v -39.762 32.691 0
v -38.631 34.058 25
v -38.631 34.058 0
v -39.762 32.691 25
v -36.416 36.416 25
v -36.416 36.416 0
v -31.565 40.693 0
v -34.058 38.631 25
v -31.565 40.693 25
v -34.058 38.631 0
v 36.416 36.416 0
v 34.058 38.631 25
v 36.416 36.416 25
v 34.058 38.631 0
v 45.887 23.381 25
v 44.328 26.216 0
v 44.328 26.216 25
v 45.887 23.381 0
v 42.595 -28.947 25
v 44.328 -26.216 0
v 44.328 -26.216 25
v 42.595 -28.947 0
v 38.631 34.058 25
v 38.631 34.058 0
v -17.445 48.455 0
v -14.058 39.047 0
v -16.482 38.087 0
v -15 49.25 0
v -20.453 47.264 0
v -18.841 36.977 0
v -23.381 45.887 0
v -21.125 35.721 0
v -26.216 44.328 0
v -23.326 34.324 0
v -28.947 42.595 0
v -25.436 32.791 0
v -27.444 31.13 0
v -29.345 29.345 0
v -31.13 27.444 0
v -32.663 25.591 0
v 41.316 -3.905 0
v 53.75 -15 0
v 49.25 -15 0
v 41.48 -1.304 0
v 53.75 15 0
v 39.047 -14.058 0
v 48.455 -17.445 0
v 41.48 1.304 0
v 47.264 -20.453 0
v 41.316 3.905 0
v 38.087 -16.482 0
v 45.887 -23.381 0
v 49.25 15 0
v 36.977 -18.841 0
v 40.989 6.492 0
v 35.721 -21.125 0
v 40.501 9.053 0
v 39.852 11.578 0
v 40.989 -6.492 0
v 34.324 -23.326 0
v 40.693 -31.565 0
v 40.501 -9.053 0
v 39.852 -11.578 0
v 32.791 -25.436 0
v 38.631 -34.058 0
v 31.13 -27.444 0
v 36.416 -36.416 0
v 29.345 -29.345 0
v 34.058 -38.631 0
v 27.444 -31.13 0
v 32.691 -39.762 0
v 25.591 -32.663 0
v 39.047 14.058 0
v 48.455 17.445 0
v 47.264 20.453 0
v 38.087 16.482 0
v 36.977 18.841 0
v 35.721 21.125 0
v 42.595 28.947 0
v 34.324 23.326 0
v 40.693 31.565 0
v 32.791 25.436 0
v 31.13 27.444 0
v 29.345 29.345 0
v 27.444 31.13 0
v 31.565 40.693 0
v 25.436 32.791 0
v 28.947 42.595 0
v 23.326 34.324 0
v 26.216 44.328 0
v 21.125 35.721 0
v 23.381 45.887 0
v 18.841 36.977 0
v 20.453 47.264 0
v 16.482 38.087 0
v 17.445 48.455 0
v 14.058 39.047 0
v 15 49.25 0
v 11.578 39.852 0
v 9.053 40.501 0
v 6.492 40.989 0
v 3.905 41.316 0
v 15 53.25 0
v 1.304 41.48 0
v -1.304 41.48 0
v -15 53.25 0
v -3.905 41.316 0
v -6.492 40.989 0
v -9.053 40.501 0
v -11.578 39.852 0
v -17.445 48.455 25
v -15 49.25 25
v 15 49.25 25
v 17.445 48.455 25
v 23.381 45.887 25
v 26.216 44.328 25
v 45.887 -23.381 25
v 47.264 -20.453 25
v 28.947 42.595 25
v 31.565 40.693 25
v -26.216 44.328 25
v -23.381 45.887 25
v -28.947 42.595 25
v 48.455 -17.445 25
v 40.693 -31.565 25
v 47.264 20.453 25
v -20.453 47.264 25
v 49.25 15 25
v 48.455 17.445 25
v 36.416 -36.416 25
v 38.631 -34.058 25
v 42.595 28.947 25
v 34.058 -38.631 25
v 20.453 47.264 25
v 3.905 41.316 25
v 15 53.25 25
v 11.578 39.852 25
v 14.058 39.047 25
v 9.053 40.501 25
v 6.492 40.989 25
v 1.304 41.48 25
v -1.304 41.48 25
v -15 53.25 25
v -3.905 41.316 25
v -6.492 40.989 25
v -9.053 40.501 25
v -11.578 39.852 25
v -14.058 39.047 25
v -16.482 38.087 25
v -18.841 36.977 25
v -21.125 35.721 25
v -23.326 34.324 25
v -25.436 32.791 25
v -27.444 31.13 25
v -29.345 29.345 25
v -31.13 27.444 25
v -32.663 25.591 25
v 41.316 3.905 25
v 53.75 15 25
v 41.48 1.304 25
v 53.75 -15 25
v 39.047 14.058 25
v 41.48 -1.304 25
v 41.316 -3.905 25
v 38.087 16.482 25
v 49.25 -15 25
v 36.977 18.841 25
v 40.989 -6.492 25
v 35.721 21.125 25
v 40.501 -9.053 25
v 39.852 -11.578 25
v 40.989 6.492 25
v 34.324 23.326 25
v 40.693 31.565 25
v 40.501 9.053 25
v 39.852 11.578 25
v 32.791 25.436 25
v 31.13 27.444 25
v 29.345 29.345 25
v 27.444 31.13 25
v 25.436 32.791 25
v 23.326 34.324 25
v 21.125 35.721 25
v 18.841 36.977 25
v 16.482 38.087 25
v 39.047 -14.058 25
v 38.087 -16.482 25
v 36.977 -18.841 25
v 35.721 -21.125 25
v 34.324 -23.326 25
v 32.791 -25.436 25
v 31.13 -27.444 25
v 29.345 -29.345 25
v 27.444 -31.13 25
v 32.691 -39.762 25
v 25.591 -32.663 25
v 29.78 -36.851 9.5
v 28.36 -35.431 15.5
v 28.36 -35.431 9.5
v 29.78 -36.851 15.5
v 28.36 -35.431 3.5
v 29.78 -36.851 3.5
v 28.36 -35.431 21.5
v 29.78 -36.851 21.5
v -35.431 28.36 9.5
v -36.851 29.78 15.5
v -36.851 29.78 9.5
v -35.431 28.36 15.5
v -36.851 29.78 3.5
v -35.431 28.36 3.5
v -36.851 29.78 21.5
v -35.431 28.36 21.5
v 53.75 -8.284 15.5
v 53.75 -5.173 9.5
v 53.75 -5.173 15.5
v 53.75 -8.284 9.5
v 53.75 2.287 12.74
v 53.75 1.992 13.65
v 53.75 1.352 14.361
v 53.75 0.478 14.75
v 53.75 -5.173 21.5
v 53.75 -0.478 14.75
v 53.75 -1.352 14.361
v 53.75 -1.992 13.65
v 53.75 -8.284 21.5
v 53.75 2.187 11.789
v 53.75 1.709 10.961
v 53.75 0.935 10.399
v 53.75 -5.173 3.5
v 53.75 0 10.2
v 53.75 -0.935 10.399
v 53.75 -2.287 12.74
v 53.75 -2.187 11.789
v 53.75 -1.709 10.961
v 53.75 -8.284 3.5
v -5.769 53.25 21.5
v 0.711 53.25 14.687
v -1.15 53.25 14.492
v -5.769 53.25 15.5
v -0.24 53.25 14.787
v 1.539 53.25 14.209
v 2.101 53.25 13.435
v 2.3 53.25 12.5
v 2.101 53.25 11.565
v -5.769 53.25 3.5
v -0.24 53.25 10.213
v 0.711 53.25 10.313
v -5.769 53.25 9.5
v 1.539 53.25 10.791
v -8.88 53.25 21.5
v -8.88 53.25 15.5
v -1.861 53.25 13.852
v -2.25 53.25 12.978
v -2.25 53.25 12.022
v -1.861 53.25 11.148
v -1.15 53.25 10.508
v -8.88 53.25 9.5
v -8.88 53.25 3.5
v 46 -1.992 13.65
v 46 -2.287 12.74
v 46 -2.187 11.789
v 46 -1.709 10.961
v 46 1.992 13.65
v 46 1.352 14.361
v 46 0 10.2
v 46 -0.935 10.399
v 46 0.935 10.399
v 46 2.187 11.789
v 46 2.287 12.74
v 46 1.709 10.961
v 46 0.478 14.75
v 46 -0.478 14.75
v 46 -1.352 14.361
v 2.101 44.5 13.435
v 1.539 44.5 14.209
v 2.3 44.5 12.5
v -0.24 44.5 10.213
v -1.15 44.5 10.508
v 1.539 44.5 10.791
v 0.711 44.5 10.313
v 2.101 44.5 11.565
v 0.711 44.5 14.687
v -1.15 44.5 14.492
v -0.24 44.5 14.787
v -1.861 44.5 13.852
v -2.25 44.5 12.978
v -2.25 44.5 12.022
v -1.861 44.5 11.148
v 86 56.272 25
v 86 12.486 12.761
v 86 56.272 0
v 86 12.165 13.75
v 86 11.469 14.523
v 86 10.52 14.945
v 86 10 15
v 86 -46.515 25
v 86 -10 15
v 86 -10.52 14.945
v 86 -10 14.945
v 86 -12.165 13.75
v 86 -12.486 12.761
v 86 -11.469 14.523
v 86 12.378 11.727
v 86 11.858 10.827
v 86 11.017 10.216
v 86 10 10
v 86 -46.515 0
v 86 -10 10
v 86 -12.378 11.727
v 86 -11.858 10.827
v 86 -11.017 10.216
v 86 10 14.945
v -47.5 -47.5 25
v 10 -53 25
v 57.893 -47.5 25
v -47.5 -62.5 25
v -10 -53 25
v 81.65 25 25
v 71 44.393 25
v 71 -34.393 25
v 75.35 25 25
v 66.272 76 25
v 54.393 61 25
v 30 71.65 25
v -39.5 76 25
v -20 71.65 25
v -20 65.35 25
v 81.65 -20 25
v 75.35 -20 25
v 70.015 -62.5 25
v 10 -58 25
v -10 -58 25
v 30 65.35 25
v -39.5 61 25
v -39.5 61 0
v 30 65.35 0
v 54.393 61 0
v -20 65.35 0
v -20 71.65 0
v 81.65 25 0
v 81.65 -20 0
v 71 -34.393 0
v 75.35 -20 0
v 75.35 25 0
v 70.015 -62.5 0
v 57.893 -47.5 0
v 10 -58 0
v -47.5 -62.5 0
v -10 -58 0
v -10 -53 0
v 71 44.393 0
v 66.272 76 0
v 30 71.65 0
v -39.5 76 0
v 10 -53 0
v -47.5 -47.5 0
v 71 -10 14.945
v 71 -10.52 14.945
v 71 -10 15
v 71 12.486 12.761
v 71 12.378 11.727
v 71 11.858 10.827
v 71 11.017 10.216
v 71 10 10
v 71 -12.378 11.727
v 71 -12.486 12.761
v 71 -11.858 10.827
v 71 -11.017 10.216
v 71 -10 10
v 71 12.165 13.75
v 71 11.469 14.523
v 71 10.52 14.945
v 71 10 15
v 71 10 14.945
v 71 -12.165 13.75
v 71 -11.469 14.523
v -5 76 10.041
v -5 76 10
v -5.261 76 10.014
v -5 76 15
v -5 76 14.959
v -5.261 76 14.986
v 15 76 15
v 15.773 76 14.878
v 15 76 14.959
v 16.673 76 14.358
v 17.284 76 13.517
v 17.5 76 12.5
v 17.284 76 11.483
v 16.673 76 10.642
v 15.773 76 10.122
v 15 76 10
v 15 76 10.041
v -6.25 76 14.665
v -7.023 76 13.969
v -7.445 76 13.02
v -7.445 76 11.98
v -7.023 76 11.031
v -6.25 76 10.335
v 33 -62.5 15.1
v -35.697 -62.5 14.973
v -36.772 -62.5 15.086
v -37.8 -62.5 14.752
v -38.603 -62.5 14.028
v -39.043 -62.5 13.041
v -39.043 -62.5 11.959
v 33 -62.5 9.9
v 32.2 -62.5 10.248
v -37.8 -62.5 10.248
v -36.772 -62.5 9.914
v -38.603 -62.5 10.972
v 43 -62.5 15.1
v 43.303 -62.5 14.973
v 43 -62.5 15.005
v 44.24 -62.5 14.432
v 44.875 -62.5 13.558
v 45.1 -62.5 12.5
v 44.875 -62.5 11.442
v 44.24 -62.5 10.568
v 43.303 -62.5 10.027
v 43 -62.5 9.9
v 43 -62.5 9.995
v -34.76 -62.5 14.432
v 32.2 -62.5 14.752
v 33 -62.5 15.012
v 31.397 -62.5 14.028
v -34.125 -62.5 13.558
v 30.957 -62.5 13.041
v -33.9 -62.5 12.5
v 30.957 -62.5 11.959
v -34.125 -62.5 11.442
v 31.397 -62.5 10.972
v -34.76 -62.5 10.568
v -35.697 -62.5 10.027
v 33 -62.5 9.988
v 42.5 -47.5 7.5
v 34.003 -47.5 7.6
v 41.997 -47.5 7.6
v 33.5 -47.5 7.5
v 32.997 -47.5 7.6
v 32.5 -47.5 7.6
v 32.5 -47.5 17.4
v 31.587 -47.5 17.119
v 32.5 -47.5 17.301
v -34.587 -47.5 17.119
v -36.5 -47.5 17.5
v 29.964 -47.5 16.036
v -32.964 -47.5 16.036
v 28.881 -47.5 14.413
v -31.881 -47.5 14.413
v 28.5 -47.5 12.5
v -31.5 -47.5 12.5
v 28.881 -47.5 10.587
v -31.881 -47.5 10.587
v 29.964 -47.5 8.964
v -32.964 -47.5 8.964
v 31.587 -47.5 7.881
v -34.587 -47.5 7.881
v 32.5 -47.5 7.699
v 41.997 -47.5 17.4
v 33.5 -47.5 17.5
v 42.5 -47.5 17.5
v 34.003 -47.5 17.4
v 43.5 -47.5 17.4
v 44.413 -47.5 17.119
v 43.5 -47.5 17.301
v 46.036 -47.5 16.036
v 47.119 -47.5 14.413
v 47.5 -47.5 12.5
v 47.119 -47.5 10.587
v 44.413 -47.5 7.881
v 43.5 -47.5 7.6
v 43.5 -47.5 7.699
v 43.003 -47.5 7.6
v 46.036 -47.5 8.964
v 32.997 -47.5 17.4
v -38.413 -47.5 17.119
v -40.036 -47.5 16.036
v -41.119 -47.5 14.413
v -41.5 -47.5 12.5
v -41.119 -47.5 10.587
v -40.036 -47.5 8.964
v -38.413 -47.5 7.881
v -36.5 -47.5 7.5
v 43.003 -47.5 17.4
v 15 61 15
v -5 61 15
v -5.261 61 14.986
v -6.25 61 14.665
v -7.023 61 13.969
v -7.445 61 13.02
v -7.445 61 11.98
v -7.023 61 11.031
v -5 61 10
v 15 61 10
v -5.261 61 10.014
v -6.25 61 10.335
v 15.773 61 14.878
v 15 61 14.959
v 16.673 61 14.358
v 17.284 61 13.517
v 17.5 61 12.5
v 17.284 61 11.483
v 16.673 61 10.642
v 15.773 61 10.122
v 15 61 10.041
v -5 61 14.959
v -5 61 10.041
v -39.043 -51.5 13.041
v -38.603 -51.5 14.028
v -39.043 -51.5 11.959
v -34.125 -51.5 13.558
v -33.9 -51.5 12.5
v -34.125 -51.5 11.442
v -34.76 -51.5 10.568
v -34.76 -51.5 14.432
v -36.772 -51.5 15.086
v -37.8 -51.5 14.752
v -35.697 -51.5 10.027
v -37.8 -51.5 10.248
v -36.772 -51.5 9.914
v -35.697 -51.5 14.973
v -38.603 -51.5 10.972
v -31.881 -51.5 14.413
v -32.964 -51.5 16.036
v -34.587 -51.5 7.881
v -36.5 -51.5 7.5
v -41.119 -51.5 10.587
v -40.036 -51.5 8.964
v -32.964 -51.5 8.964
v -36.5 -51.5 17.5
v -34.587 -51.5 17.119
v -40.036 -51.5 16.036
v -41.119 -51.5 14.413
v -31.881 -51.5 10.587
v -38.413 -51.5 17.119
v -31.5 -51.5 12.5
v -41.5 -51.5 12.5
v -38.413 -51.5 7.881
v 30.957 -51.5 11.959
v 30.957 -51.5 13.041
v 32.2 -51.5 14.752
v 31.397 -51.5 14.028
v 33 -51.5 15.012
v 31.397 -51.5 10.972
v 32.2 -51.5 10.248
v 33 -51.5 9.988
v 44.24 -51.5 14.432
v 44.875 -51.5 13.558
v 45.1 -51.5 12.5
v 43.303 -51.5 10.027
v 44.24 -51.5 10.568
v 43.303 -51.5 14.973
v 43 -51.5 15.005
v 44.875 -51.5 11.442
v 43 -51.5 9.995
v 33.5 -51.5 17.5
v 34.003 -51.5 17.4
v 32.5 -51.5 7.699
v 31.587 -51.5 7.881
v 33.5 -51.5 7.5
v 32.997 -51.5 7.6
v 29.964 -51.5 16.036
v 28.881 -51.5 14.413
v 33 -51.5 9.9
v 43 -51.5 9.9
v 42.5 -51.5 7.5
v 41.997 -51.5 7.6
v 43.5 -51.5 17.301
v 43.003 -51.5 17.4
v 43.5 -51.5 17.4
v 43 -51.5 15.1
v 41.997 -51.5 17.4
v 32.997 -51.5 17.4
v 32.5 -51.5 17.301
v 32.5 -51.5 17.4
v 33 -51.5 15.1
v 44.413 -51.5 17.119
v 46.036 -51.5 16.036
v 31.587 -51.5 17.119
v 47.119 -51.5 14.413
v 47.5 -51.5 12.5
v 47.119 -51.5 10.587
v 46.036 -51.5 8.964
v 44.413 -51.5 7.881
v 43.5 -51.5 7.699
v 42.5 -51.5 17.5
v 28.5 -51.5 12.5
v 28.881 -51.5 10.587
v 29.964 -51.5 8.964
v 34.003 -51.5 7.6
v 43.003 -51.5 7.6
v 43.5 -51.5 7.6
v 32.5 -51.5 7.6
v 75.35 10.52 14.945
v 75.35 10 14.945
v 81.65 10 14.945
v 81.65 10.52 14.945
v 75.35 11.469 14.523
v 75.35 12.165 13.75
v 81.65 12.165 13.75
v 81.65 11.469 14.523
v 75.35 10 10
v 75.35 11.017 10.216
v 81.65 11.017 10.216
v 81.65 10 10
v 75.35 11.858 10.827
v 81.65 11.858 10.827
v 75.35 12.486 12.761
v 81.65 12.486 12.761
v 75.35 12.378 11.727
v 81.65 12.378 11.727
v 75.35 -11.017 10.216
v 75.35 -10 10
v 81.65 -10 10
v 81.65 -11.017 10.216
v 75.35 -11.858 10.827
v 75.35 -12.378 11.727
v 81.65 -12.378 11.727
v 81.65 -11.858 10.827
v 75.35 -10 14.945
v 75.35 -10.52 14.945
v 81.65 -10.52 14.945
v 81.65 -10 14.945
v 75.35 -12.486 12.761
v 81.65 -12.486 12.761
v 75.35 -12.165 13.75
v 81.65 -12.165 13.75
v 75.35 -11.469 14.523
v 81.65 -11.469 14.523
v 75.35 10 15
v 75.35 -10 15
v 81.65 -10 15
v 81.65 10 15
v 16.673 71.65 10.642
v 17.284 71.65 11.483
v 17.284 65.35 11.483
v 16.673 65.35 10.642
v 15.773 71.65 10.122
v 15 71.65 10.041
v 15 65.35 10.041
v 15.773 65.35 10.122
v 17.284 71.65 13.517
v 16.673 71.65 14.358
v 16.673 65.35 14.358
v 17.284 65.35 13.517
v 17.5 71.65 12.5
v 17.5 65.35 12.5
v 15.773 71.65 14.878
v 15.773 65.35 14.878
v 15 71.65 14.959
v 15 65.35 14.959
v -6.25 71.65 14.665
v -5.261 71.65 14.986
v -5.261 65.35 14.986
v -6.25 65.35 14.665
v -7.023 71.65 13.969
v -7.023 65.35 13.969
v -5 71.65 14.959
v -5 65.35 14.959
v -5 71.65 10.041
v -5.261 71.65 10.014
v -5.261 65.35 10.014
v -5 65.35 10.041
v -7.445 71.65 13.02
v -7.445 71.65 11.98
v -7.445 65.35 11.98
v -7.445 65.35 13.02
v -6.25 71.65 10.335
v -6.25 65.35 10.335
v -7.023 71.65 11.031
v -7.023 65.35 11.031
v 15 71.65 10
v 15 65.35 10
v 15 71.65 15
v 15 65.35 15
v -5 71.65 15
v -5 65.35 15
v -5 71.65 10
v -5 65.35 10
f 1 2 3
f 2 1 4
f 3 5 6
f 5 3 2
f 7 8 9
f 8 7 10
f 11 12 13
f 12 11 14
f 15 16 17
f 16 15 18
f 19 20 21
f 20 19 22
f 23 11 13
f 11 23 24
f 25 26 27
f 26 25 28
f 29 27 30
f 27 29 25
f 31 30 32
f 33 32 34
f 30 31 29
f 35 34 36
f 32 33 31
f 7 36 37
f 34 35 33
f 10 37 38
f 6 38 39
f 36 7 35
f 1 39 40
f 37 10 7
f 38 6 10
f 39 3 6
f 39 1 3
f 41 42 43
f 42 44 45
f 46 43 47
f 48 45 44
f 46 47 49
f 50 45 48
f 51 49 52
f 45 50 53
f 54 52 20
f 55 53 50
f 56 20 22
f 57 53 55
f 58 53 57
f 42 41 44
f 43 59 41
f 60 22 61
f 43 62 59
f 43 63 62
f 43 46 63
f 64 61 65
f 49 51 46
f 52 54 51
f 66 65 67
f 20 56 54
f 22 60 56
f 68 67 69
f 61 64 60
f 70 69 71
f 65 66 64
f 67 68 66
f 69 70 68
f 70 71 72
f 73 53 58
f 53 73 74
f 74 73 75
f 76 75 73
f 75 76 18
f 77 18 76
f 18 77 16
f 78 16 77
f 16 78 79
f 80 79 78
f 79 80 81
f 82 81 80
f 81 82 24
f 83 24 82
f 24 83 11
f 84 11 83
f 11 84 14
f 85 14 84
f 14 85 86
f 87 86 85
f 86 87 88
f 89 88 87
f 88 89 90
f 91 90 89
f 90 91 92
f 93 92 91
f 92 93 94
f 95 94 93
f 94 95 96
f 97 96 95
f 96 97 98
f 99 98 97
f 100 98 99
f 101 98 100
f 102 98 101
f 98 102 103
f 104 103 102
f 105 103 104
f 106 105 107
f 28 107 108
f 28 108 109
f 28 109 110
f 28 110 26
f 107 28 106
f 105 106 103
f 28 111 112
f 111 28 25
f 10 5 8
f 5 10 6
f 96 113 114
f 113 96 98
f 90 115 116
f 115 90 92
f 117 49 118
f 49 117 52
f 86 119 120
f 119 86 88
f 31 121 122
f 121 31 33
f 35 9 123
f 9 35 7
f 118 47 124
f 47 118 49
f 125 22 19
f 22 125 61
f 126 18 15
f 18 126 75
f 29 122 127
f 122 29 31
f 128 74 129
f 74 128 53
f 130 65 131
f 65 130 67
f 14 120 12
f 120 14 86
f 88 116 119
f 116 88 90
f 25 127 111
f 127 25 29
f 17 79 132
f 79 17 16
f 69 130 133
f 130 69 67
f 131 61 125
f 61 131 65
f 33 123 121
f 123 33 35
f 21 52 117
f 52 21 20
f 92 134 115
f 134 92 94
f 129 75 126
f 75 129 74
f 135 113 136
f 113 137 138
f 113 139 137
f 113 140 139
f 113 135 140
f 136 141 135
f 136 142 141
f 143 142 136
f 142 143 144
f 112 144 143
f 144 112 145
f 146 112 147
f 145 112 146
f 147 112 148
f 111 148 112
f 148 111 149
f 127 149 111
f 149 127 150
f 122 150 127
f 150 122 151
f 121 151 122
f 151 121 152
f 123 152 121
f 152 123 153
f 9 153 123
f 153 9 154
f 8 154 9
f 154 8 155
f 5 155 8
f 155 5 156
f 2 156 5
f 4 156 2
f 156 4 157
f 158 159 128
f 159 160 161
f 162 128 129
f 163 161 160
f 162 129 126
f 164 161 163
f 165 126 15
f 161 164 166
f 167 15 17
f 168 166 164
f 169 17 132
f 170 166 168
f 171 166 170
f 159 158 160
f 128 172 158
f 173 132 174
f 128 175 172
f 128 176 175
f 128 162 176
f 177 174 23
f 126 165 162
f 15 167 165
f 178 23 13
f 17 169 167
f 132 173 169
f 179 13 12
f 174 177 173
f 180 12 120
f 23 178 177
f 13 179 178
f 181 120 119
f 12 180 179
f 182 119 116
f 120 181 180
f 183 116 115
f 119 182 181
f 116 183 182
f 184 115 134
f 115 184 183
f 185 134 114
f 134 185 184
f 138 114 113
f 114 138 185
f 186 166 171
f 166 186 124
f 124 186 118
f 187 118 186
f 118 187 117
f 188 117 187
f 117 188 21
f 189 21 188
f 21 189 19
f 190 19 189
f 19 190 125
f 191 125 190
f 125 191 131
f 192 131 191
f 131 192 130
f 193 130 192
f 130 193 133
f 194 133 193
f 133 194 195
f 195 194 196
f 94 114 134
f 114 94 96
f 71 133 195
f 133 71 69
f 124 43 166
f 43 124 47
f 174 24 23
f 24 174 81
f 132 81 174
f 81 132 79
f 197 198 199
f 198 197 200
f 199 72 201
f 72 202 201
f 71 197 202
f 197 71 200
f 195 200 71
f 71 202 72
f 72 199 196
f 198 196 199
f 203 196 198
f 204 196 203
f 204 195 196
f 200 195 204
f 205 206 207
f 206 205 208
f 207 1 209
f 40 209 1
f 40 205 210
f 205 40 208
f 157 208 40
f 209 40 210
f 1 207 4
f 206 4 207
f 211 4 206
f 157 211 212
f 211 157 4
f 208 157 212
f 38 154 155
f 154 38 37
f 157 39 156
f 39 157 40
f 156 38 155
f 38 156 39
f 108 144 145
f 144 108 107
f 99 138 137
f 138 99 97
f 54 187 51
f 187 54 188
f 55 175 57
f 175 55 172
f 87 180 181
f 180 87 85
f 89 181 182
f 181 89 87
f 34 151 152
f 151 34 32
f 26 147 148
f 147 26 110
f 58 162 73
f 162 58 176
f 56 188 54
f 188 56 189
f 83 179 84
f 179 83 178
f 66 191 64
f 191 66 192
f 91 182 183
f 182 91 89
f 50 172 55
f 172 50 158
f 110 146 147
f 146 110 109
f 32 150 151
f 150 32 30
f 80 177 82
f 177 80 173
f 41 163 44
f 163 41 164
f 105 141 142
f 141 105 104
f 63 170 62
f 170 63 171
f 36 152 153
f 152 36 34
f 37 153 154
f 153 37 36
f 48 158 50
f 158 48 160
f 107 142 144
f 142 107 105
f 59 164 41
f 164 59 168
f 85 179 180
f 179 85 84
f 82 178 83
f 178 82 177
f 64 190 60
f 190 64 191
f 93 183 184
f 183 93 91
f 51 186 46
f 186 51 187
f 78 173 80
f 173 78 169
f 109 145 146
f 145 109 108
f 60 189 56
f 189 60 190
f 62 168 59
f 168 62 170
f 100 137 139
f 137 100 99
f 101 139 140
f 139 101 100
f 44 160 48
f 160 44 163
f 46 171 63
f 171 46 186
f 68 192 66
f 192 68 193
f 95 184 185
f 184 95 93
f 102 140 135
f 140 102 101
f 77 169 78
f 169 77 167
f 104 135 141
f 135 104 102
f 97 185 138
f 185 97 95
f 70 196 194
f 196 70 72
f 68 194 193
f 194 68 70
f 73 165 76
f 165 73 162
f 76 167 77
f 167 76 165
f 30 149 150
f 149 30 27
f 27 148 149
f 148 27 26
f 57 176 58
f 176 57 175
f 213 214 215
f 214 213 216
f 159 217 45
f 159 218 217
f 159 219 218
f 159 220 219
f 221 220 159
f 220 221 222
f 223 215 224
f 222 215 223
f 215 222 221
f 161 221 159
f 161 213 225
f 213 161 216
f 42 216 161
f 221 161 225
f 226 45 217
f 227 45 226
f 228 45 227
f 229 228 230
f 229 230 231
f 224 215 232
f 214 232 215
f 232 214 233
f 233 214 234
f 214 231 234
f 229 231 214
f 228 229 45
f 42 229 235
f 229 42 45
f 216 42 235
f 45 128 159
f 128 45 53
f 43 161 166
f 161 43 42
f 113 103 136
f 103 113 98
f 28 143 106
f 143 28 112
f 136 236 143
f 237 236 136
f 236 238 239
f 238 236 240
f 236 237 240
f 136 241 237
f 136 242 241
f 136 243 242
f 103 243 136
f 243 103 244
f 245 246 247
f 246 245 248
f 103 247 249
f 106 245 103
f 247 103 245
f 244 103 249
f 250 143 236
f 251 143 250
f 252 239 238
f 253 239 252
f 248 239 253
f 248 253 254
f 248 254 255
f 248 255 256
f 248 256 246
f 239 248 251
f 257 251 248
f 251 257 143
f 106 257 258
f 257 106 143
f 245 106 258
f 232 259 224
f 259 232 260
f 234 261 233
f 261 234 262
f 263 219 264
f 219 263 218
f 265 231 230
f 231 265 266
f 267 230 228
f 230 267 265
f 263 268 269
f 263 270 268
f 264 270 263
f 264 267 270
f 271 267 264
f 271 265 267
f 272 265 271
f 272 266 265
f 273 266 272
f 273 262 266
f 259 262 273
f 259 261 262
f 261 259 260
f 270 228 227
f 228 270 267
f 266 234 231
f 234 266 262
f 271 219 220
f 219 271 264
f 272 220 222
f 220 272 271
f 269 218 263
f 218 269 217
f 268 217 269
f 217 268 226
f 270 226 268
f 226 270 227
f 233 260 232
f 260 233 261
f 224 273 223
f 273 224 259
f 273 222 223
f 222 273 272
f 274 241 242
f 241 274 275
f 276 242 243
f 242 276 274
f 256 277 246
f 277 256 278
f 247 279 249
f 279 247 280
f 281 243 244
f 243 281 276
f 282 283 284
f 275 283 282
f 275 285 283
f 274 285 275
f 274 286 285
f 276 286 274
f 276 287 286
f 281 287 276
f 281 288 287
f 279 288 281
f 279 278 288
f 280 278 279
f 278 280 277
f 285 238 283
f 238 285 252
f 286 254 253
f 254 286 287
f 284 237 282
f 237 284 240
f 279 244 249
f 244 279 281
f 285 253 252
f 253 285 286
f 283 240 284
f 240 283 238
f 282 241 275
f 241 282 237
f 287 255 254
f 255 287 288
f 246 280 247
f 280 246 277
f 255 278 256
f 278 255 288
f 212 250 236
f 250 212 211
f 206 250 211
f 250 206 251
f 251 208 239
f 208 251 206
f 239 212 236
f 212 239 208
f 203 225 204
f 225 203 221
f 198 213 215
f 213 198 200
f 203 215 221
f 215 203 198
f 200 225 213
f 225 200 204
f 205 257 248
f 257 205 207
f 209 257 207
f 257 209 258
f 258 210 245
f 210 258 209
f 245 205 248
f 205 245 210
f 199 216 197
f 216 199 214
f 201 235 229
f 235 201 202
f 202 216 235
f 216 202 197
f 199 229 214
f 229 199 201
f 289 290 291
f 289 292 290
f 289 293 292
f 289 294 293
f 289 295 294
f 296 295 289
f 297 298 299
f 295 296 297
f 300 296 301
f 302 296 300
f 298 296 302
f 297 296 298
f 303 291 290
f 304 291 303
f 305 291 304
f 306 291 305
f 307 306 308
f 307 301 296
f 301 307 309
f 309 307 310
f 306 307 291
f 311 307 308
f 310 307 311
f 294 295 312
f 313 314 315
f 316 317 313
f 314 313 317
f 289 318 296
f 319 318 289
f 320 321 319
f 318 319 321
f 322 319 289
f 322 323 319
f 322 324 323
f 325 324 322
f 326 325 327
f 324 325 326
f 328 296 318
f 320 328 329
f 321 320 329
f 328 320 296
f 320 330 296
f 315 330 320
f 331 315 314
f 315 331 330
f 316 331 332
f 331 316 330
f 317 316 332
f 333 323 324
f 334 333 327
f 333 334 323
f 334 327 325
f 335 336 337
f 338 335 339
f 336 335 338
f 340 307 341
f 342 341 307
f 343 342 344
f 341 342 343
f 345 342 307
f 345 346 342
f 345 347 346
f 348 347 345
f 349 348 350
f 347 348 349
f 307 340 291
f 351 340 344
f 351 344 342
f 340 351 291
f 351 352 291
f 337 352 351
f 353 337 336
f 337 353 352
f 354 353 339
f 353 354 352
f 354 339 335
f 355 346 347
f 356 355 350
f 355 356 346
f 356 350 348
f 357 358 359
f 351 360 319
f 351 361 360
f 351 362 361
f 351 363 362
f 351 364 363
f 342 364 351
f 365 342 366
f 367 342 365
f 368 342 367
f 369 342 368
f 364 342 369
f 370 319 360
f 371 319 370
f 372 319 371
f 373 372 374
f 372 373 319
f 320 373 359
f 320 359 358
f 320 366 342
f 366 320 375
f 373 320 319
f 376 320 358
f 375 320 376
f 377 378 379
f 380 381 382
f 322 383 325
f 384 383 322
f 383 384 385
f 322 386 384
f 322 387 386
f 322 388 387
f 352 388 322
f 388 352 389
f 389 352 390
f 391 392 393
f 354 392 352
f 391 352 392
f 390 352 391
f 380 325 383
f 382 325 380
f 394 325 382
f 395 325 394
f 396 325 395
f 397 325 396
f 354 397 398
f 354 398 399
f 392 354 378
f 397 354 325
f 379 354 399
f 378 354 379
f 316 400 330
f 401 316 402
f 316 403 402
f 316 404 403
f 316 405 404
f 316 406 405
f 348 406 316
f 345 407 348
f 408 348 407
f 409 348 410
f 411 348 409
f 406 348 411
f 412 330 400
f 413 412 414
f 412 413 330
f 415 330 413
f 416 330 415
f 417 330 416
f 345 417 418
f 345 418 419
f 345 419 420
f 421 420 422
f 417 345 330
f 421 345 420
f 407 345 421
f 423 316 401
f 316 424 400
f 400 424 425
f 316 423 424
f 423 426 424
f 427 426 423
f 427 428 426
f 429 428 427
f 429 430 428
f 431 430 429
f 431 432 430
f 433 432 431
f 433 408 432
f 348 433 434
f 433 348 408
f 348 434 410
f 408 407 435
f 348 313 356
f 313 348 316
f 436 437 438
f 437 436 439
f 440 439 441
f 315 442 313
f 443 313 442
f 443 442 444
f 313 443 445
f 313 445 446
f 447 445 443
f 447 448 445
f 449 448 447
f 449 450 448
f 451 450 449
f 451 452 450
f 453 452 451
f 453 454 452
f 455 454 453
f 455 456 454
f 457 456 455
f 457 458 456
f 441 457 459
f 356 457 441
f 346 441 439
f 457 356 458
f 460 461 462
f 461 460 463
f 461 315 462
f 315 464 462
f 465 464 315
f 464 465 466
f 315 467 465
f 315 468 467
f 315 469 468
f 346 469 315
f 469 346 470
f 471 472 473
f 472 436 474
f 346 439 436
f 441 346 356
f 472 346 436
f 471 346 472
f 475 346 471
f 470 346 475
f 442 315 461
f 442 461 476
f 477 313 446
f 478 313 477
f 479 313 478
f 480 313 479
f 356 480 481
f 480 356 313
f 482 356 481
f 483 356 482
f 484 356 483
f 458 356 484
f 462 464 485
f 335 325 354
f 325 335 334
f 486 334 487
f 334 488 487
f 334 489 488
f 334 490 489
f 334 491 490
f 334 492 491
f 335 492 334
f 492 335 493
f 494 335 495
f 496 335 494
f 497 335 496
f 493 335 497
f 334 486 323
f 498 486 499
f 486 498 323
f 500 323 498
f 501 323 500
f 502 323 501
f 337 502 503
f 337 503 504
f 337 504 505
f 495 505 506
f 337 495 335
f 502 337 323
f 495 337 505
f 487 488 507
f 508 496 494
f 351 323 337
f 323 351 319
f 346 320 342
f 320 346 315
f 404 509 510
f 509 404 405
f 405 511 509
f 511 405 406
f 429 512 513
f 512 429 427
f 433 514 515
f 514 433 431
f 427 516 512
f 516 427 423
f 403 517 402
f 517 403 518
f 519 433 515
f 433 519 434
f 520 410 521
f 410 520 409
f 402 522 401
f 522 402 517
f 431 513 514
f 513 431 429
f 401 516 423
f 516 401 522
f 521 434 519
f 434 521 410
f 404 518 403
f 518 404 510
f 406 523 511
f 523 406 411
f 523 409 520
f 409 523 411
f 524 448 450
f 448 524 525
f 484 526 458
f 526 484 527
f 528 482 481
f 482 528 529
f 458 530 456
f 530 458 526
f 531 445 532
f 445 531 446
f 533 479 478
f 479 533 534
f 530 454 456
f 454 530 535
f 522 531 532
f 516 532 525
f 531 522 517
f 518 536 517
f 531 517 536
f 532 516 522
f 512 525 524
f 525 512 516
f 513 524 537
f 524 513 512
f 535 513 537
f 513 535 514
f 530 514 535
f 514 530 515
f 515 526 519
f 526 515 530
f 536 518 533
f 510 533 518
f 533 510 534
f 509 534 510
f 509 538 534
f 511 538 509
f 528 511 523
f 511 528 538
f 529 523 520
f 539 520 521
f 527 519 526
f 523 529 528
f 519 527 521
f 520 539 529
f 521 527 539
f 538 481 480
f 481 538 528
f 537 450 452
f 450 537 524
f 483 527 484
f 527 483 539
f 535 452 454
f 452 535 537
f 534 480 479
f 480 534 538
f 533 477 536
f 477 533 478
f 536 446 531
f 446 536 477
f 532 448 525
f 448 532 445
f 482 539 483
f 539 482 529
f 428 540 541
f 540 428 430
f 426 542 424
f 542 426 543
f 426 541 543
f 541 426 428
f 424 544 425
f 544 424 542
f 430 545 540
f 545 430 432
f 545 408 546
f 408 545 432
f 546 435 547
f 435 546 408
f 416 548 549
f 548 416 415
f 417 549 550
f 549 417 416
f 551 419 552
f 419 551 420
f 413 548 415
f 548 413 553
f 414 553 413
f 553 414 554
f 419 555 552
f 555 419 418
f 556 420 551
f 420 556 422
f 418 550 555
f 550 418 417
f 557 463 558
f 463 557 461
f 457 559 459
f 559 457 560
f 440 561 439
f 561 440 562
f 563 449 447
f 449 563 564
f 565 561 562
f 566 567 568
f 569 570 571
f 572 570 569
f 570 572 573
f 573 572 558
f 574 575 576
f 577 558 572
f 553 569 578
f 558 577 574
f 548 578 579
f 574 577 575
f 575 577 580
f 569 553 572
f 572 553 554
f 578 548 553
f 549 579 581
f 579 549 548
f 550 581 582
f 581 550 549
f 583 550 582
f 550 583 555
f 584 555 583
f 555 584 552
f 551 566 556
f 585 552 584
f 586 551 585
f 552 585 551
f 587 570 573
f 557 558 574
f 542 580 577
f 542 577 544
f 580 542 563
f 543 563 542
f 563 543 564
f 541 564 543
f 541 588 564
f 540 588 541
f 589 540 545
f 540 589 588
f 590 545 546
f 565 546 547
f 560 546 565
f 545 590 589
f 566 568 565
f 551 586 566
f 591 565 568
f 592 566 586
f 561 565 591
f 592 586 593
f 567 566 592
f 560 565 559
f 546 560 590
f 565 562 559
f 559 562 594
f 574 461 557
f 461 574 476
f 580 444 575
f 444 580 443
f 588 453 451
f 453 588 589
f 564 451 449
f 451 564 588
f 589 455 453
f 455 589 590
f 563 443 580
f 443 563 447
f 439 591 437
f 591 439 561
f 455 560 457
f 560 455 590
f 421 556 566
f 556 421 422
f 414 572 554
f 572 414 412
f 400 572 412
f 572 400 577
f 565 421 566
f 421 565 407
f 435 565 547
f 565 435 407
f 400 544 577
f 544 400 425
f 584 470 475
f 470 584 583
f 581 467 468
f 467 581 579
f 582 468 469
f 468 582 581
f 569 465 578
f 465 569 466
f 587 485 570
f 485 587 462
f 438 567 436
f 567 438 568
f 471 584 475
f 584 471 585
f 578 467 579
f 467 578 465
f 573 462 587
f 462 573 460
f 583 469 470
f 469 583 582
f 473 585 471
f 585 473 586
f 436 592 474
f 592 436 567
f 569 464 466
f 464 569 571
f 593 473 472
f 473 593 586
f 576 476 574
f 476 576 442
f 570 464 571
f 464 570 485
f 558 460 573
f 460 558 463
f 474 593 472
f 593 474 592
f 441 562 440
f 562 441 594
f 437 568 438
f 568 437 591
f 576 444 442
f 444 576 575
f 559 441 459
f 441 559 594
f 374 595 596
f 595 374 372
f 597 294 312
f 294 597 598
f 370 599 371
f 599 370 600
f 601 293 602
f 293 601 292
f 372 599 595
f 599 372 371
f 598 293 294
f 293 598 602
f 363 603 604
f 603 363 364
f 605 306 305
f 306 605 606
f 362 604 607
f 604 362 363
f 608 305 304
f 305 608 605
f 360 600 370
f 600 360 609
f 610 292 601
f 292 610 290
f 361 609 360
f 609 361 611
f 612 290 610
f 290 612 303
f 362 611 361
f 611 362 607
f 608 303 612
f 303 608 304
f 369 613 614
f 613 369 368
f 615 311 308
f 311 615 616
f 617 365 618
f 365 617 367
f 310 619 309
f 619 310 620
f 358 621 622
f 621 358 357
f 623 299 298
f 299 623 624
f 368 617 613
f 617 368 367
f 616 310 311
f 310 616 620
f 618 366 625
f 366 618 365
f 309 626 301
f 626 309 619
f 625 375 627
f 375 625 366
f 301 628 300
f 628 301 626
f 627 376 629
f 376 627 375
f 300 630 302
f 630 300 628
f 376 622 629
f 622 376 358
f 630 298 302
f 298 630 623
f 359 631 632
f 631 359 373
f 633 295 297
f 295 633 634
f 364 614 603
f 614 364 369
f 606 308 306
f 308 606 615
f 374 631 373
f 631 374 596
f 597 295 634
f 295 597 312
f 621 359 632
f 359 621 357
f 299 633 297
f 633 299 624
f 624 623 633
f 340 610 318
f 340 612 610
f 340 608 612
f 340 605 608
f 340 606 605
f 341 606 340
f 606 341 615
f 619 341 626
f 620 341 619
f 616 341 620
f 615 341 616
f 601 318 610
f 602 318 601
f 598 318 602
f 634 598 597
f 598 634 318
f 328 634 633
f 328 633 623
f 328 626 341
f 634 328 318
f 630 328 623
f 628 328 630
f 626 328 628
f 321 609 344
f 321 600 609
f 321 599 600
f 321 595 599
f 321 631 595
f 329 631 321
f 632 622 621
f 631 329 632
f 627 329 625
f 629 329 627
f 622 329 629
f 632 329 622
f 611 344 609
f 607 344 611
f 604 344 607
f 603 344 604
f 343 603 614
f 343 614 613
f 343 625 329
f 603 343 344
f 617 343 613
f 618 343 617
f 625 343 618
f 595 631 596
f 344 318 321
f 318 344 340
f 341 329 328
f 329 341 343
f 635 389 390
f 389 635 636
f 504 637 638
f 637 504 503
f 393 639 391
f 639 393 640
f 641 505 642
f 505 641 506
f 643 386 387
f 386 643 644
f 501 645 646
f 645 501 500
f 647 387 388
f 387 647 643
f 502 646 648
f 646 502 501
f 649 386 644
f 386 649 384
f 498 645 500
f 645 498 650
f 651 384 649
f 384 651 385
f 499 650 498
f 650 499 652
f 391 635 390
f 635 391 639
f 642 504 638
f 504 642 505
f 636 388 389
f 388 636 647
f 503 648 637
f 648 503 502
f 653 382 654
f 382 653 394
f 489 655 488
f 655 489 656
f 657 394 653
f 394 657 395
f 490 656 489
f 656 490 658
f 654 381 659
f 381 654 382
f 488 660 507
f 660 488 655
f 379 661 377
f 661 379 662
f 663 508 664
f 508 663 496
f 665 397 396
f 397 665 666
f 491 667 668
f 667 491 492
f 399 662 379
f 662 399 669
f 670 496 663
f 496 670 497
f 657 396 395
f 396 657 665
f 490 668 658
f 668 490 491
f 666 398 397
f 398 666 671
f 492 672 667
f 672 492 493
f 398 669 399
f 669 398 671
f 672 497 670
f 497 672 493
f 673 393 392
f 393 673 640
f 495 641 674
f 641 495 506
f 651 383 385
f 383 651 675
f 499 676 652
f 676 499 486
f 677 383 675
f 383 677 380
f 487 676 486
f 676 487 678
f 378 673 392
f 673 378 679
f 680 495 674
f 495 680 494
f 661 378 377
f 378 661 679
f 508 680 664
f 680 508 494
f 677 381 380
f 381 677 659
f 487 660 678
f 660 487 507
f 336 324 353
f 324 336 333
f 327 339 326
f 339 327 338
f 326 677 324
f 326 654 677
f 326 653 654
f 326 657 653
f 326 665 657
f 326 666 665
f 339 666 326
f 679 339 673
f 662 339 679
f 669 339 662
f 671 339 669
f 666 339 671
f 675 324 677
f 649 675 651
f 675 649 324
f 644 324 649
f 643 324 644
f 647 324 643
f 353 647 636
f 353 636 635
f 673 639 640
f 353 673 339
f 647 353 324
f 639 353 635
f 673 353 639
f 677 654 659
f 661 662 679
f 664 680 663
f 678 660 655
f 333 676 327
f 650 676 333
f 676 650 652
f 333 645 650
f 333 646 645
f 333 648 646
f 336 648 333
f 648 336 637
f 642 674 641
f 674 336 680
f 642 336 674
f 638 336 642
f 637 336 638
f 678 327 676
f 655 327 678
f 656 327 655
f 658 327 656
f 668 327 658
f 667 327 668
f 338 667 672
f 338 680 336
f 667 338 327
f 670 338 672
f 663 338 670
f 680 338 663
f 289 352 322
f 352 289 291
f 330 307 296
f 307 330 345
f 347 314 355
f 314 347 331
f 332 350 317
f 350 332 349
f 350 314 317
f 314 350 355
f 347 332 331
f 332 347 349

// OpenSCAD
// === V4: Removed all nut inserts in the inner holder/support, made screw holes smaller and not thru. This is so you can tap screws directly into mount without any nuts.
// --- V5: Outer bracket mounting holes need to be 48 mm apart (not 45)
// --- V6: Longer external bracket (10mm towards back) to fit tube. Added elongated mounted screw hole
tube_d=80;
//tube_d=55;
tube_r=tube_d/2;
// ==========================================================================================================
// ---- Tube hanger (inner support) ---
// ==========================================================================================================
module hanger(){ 
difference(){
union(){
    
rotate([0,0,-45+180]){
difference(){ // Center tube holder
cylinder(r=tube_r+1.5+10,h=25,$fn=100,center=true); // OD

//translate([0,25,0])  cube([80,70,25],center=true); // Cut more than half of holder
  translate([0,35,-0.01])  cube([120,60,25.2],center=true); // Cut half of holder

cylinder(r=tube_r+1.5,h=25.1,$fn=100,center=true); // ID
}
}

translate([tube_r+10,0,0])  cube([7.5,30,25],center=true); // Back square protrusion
translate([0,tube_r+9.5,0])  cube([30,7.5,25],center=true);// Top square protrusion
}
translate ([tube_r+11,0,0]) rotate([0,90,0]) cylinder(r=2.3,h=10,$fn=15,center=true); // Back screw hole
translate ([0,tube_r+9.5,0]) rotate([90,0,0]) cylinder(r=2.3,h=10,$fn=15,center=true);// Top screw hole


// Top opening for zip-ties
rotate([0,0,45-5]) translate([0,tube_r+6.5-1,6])   cube([100,2,6],center=true);
rotate([0,0,-90-45+5]) translate([0,tube_r+6.5-1,6])   cube([100,2,6],center=true);
// Bottom opening for zip-ties
rotate([0,0,45-5]) translate([0,tube_r+6.5-1,-6])   cube([100,2,6],center=true);
rotate([0,0,-90-45+5]) translate([0,tube_r+6.5-1,-6])   cube([100,2,6],center=true);



// Nut holes
//translate([28.8,0,0]) rotate([30,0,0]) rotate([0,90,0]) cylinder(r=5.65,h=8,$fn=6,center=true); // Inner
//translate([40,0,0]) rotate([30,0,0]) rotate([0,90,0]) cylinder(r=5.65,h=3,$fn=6,center=true); // Outer
//translate([0,28.8,0]) rotate([90,0,0]) cylinder(r=5.65,h=8,$fn=6,center=true); // Inner
//translate([0,40,0]) rotate([90,0,0]) cylinder(r=5.65,h=3,$fn=6,center=true); // Outer

}

}


// ==========================================================================================================
// ---- External Bracket ---
// ==========================================================================================================
module ex_bracket () {
  difference(){ 
    union(){
        translate([38.5+tube_r,6.75,0]) cube([15,tube_d+58.5,25],center=true); // Back end
        translate([15,-15-tube_r,0]) cube([tube_d+45,15,25],center=true); // Bottom
        translate([17.5,tube_r+28.5,0]) cube([34+tube_d,15,25],center=true); // Top
        translate([28.5+tube_r,17.5+tube_r,0]) rotate([0,0,45]) cube([15,25,25],center=true); // Upper inner corner cut
        translate([28.5+tube_r,-tube_r-7.5,0]) rotate([0,0,-45]) cube([15,25,25],center=true); // Lower inner corner cut
    }

    // ---------------------------------------------------------------------------------------------------------
    // --- Bracket Mounting Holes
    translate([-tube_r+3.5,0,0]) translate ([0,-50.5-tube_r,0]) rotate([90,0,0]) cylinder(r=2.6,h=100,$fn=15,center=true); //Mounting hole #1
    translate([-tube_r+3.5,0,0]) translate ([0,-tube_r-6.5,0]) rotate([90,0,0]) cylinder(r=5,h=10,center=true); //Head slot for mounting screw #1
    
    // --- Elongated Mounting hole #2
    translate([tube_r-6.5,0,0]) translate ([0,-tube_r-50.5,0]) rotate([90,0,0]) cylinder(r=2.6,h=100,$fn=15,center=true);//Mounting hole #2.1
    translate([tube_r+2.5,0,0]) translate ([0,-tube_r-50.5,0]) rotate([90,0,0]) cylinder(r=2.6,h=100,$fn=15,center=true);//Mounting hole #2.2
    translate([tube_r-6.5,0,0]) translate ([0,-tube_r-6.5,0]) rotate([90,0,0]) cylinder(r=5,h=10,center=true); //Head slot for mounting screw #2.1
    translate([tube_r-2,-tube_r-17.5,0]) cube([10,15,5.2],center=true); // Slot that joins two mounting hole #2 parts
    translate([tube_r+2.5,0,0]) translate ([0,-tube_r-6.5,0]) rotate([90,0,0]) cylinder(r=5,h=10,center=true); //Head slot for mounting screw #2.2
    translate([tube_r-2,-tube_r-8.5,0]) cube([11,6,9.8],center=true); // Slot that joins two mounting Head hole #2 parts 
    
    
    
    // ---------------------------------------------------------------------------------------------------------
    // --- Front Adjustment Screw Slots (moves tube up/down) ----
    translate([0,10,0]) rotate([0,90,0]) cylinder(r=2.5,h=200,$fn=15,center=true); // Screw slot end upper(back side)
    translate([0,-10,0]) rotate([0,90,0]) cylinder(r=2.5,h=200,$fn=15,center=true); // Screw slot end lower (back side)
    translate([38.5+tube_r,0,0]) cube([15.1,20,5],center=true); // --- Front adj opening (Square connection joining two holes)
    translate([38.5+tube_r,2.5,0]) cube([6.3,45,25.1],center=true);// Adjustment nut slot (front)
    
    // ---------------------------------------------------------------------------------------------------------
    // --- Upper Adjustment Screw Slots (moves tube Front/Back) ----
    translate([15,tube_r+2.5,0]) rotate([90,0,0]) cylinder(r=2.5,h=100,$fn=15,center=true); // Screw slot end back (upper side)
    translate([-5,tube_r+2.5,0]) rotate([90,0,0]) cylinder(r=2.5,h=100,$fn=15,center=true); // Screw slot end front(upper side)
    translate([5,tube_r+28.5,0]) cube([20,15.1,5],center=true); // Slot that joins two holes on upper part
    translate([5,tube_r+28.5,0]) cube([50,6.3,25.1],center=true); // Adjustment nut slot (upper)
    
    // ---------------------------------------------------------------------------------------------------------
    translate([tube_r+42.5,tube_r+32.5,0]) rotate([0,0,45]) cube([18,55,25.2],center=true); // Upper corner cut
    translate([44.5+tube_r,-tube_r-16.5,0]) rotate([0,0,-45]) cube([12,35,25.2],center=true); // Low corner cut
    translate([0,-tube_r-15.5,0])  cube([20,5,25.2],center=true); // Slot in lower part (just to lighten part)
  }
    //translate([0,-50,0]) cube([170,2,25],center=true);

    //UNCOMMENT TO SEE 8mm rod
    //translate([52,0,0]) rotate([0,90,0]) cylinder(r=4,h=50,$fn=15,center=true);
    //translate([0,52,0]) rotate([90,0,0]) cylinder(r=4,h=50,$fn=15,center=true);


    //translate([22,-59,0]) cube([90,15,8],center=true);
    //translate([82,8,0]) cube([15,117,8],center=true);
}

// --- Raise Both to Z=0
translate([0,0,12.5]){
    hanger();
    ex_bracket();
}
